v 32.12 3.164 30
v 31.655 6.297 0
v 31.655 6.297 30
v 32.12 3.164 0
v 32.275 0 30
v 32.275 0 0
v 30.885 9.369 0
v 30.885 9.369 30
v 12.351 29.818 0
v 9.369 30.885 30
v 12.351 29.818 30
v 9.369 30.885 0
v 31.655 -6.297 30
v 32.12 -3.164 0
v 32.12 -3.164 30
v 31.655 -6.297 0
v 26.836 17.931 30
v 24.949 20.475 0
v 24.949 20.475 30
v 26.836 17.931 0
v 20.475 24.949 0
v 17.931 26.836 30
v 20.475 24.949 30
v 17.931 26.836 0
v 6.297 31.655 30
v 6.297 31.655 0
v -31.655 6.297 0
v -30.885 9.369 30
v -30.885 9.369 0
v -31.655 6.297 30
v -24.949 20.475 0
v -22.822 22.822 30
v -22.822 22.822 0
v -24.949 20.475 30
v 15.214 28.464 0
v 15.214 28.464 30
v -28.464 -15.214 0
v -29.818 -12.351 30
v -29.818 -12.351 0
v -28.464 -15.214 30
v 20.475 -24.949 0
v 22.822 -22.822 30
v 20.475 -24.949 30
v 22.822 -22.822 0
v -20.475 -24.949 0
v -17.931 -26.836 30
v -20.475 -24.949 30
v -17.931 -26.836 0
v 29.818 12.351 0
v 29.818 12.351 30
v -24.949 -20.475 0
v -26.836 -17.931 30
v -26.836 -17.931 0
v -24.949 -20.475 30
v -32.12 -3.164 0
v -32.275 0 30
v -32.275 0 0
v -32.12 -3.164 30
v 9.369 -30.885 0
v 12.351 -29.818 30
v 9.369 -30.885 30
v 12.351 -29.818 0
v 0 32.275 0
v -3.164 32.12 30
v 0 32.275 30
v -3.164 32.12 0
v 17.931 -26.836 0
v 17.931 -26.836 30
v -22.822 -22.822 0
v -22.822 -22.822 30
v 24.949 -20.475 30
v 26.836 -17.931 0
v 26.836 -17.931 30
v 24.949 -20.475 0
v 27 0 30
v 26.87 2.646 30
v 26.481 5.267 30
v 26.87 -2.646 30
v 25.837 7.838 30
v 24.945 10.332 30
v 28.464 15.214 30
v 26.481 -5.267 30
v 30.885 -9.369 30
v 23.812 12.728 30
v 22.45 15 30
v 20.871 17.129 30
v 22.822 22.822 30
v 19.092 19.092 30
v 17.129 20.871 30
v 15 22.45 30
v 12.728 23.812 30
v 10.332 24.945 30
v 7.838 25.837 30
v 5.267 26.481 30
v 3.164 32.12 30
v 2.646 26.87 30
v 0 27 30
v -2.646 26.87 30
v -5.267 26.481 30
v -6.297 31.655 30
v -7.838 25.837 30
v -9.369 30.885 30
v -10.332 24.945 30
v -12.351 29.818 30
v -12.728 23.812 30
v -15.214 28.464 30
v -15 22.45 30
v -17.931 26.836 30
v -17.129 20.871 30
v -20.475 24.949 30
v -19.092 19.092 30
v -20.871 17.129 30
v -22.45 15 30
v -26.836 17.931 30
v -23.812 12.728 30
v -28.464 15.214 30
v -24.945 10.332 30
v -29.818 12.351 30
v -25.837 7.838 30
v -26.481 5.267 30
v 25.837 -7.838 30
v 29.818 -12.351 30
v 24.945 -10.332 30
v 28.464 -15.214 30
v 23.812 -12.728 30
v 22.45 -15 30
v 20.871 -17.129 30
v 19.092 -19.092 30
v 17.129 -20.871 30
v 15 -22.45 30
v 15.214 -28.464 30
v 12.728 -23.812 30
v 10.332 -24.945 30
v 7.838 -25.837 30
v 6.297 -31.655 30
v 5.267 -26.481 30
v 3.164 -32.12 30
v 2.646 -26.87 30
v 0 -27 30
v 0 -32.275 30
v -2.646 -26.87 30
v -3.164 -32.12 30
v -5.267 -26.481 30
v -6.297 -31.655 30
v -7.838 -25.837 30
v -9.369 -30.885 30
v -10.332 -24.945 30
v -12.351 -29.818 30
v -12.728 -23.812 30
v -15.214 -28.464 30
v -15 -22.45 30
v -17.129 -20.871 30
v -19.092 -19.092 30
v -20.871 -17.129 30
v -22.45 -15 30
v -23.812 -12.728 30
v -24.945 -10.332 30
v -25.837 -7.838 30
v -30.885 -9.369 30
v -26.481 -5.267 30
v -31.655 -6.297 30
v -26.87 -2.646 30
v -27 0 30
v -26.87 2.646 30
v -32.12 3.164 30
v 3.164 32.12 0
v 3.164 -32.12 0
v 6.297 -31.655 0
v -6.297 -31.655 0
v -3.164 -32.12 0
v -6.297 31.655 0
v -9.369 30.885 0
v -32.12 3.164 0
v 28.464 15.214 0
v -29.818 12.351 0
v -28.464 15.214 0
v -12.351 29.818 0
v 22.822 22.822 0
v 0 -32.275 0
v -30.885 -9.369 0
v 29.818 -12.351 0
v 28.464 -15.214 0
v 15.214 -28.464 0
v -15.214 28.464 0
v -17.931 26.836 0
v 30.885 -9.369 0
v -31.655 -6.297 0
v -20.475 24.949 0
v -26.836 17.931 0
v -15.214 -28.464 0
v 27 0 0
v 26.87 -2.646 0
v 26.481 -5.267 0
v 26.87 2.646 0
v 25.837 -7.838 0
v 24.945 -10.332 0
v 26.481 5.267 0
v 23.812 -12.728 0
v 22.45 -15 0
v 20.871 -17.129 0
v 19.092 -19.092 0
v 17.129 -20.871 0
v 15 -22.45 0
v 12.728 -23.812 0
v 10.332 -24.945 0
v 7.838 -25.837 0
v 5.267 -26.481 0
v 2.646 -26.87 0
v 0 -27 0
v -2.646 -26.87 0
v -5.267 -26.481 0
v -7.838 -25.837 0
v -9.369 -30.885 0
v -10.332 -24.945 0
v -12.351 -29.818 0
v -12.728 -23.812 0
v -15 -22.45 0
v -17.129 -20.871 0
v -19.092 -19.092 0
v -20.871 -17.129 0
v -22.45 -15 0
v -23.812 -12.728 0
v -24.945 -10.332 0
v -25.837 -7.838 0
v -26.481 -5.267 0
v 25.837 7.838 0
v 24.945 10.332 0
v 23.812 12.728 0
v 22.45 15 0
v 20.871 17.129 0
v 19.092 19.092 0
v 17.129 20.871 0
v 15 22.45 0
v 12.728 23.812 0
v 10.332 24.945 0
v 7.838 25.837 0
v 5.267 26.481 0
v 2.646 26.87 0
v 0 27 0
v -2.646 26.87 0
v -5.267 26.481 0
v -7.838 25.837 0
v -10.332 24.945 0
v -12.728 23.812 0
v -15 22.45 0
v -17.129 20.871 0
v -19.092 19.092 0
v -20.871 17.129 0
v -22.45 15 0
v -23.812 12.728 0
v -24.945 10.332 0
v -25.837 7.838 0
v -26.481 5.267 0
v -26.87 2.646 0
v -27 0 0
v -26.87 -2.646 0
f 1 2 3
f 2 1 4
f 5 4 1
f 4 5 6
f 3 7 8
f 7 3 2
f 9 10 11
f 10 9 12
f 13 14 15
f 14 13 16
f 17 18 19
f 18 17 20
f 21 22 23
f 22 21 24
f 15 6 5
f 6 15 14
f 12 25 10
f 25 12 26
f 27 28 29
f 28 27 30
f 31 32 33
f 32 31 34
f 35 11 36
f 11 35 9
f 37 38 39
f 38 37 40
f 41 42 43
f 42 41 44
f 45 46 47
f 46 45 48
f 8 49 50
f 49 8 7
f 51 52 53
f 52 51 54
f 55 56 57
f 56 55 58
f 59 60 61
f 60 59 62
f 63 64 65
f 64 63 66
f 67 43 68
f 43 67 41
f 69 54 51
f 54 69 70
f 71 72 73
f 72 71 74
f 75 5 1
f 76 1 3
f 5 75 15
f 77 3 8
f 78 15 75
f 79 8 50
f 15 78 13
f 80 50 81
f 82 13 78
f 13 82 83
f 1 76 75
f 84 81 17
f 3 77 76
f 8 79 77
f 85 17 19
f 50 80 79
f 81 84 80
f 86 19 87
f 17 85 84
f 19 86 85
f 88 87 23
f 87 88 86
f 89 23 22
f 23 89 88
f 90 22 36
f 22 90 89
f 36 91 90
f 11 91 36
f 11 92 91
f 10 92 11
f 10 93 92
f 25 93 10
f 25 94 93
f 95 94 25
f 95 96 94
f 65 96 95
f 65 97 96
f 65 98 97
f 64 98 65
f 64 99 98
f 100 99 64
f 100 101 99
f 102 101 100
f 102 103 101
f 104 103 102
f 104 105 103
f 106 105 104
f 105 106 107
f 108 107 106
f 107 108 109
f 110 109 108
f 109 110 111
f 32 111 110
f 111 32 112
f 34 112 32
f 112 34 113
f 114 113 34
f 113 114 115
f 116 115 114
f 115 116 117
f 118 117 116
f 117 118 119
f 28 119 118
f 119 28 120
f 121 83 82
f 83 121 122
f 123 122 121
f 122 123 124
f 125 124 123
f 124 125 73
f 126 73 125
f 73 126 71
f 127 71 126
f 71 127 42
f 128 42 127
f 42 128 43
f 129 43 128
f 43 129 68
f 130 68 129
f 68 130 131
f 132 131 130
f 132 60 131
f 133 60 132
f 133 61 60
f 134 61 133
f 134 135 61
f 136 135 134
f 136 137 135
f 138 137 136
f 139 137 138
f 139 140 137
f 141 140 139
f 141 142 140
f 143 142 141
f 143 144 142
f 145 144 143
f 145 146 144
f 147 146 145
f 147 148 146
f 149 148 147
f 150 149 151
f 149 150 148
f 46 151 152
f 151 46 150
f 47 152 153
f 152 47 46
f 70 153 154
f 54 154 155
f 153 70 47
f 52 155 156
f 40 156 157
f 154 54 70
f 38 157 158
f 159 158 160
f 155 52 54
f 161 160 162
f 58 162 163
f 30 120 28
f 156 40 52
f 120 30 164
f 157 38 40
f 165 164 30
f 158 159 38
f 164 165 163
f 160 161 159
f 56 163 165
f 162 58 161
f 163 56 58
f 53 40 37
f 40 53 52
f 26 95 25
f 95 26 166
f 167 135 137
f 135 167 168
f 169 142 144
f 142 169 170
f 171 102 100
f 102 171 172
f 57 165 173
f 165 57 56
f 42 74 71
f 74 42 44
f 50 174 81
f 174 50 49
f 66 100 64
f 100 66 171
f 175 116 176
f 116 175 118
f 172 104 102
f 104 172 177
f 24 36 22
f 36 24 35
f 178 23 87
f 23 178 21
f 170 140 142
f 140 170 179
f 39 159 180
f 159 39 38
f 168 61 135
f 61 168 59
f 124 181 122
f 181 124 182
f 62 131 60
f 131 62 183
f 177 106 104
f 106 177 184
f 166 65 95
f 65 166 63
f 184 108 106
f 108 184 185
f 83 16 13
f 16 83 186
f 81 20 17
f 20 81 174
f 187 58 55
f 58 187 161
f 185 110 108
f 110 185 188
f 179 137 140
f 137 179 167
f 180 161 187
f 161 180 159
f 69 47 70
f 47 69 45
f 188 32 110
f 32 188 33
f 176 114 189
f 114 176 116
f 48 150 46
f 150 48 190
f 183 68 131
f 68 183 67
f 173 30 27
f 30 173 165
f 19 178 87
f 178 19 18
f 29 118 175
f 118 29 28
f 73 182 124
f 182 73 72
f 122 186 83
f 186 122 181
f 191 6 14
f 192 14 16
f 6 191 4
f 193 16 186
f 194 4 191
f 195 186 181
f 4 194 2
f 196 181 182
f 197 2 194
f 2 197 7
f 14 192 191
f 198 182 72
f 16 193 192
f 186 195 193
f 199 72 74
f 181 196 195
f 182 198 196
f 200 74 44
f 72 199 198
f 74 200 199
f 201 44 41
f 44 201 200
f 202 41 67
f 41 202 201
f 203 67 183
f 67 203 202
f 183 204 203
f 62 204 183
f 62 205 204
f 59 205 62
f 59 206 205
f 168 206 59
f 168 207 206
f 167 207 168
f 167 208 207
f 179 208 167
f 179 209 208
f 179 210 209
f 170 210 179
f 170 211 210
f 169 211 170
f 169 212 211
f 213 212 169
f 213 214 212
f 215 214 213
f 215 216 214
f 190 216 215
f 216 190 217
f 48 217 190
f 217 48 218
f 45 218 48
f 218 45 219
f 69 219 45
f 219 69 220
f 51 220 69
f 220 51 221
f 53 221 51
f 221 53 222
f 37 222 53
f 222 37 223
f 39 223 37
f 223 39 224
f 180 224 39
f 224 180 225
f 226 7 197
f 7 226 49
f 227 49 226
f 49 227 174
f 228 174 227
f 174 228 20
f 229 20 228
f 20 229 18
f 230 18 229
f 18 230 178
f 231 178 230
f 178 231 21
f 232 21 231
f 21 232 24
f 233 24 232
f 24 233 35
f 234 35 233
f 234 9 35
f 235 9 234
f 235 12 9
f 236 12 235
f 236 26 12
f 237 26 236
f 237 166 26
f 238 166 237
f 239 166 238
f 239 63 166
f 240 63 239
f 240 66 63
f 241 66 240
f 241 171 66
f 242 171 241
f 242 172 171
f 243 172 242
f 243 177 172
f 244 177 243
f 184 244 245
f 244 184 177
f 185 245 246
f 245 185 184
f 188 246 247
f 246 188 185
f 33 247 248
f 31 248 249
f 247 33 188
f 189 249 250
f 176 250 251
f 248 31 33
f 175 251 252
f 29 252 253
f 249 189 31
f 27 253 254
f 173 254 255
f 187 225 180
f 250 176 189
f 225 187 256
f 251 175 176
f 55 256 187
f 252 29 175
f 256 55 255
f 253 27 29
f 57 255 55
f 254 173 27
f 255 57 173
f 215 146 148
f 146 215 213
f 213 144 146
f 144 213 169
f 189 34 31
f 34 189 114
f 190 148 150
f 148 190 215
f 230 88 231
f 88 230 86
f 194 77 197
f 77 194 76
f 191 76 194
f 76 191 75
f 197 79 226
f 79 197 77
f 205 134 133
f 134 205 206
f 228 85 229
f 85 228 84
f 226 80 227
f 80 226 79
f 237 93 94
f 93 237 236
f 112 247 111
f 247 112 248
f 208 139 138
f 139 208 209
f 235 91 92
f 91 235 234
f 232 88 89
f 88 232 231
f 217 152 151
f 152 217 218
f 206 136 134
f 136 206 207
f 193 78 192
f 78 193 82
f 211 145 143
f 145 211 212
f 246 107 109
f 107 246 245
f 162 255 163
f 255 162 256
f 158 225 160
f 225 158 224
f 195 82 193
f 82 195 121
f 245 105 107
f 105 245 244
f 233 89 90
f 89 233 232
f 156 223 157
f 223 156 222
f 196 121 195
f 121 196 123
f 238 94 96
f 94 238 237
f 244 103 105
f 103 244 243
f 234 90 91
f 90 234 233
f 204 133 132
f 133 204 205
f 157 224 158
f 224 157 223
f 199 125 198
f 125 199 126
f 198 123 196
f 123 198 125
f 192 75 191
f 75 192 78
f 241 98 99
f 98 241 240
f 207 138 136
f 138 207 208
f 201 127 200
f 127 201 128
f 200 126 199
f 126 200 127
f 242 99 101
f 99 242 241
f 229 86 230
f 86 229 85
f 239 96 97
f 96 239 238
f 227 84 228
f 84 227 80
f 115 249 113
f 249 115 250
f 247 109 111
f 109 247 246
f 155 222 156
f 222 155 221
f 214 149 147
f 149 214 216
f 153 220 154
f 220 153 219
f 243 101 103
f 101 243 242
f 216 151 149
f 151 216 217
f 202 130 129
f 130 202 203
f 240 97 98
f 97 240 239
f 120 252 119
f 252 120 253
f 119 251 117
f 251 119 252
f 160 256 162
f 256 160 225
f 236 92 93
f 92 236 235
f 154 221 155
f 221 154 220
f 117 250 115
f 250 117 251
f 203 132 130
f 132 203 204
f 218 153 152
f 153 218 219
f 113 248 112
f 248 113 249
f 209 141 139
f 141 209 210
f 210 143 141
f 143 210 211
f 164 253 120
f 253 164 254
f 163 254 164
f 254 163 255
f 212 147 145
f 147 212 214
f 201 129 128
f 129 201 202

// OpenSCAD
// file: ../config/parameters.scad
// cobot-lite 전역 파라미터 (global parameters)
// 모든 부품 치수는 이 파일에서만 정의한다 — 매직 넘버 하드코딩 금지 (MEC-008)

/* ===== 출력/렌더링 ===== */
$fn = 64;

/* ===== 공통 가공 여유 (파생 치수에서 참조 — 선행 정의 필수) ===== */
clearance_fit = 0.3;      // 회전/슬라이드 끼움 여유
bolt_hole_oversize = 0.4; // 관통 볼트 홀 여유

/* ===== 베어링 (bearing) — CON-002: 이 4종만 사용 =====
   [내경, 외경, 폭] mm */
BRG_608ZZ  = [8,  22, 7];   // 관절 피벗 (8mm 숄더 볼트)
BRG_625ZZ  = [5,  16, 5];   // 평행 링크 피벗 (5mm 숄더 볼트)
BRG_6805ZZ = [25, 37, 7];   // 손목 롤 축, 중구경 허브
BRG_6810ZZ = [50, 65, 7];   // 베이스 턴테이블 메인 베어링

// 베어링 압입 공차 (press-fit tolerance) — MFG-002
// 외경 기준 -0.1 ~ -0.2mm. 프린터별 보정은 이 변수 하나로 조정한다.
bearing_press_fit = -0.15;

/* ===== 숄더 볼트 (stripper/shoulder bolt) — CON-001 ===== */
shoulder_d_small = 5;   // 625ZZ 결합
shoulder_d_large = 8;   // 608ZZ 결합

/* ===== 링크 길이 — MEC-006 [TBD-4] =====
   리치 500mm 잠정. 비대칭 분할 (J2 자중 부담 보상, MEC-001a 분담 구조) */
L1 = 225;   // 상완 (upper arm): J2 축 → J3 축
L2 = 275;   // 하완 (forearm): J3 축 → 공구 플랜지

/* ===== 링크 꺾임 (팔레타이저식 구조 오프셋) =====
   관절 축 좌표는 불변(직선 L1/L2 기준) — 꺾임은 빔 형상만 변경.
   목적: ① 신장/접힘 한계 자세에서 빔-빔 간섭 여유 확보
        ② 구조 외곽을 축선 위로 올려 저자세 작업 시 팔꿈치 하부 돌출 감소
   니(knee) 수직 오프셋 h = L·pos·(1-pos)·tan(deg) */
ua_bend_deg = 12;     // 상완 꺾임각 (0 = 직선)
ua_bend_pos = 0.68;   // 꺾임 위치 (0~1, J2 기준) — 분할 조인트(95~131) 뒤
fa_bend_deg = 12;     // 하완 꺾임각
fa_bend_pos = 0.5;    // 꺾임 위치 (팔꿈치 기준)

/* ===== 가동 엔벨로프 (소프트 리미트 권고값 — docs/design-notes.md) =====
   접힘각 = J3 - J2 (월드 피치 차).
   -90° = 평행사변형 구동 전동각(transmission angle) 특이점 (크랭크∥링크),
     0° = 완전 신장 특이점 (J2·J3·손목 일직선). 양쪽 모두 운용 금지 */
env_fold_min = -75;   // 접힘 한계 (전동각 sin25° ≈ 0.42 이상 확보)
env_fold_max = -3;    // 신장 한계 (리치 ≈ 499.5mm — 공칭 500 대비 -0.5)

// J3 모터 후방 배치 연장 길이 (MEC-001c)
// J2 액추에이터는 J2 축 동축 직결 (MEC-001b) — 후방 배치 대상은 J3 어셈블리만
// J1 회전 시 베이스·작업물 간섭 확인 필수
rear_extension = 80;    // J2 피벗 → J3 모터+기어박스 어셈블리 중심 [잠정]

/* ===== 턴테이블 (turntable) — MEC-003 ===== */
turntable_bearing_gap = 30;   // 6810ZZ 2개 축방향 이격, 30mm 이상 (SHOULD)

/* ===== 모터 (motor) — CON-004: 산요덴키 SF24 시리즈 =====
   NEMA 17 호환 42각 */
motor_frame = 42;             // 프레임 폭 (mm)
nema17_hole_pitch = 31;       // 고정 볼트 피치
nema17_pilot_d = 22;          // 센터 파일럿 직경
nema17_bolt_d = 3;            // M3

/* ===== 감속비 (gear ratio) — CON-005: 5/10/20만 허용 ===== */
// 주의: MG17-G10(10:1)은 허용 토크 5N·m로 급락 — 변경 시 토크 재검증 (docs/torque-budget.md)
ratio_J1 = 20;
ratio_J2 = 20;
ratio_J3 = 20;   // SF2423 + 20:1 확정 (TBD-3 해결)
ratio_J4 = 5;

/* ===== 기어박스 (gearbox) — MG17 데이터시트 (docs/tbd-research.md TBD-5) ===== */
gbx_frame = 42;            // NEMA 17 플랜지, 모터와 동일 42각
gbx_len_20to1 = 51;        // MG17-G20 길이 (J1~J3)
gbx_len_5to1  = 40;        // MG17-G5 길이 (J4)
gbx_out_shaft_d = 8;       // 출력축 직경
gbx_in_insert = 9.5;       // 입력 결합 깊이 — SF24 축 길이 호환 확인 항목
gbx_mass_20to1 = 400;      // g — 질량 예산 계산용
gbx_mass_5to1  = 350;      // g

/* ===== 모터 몸체 치수 — SF24 카탈로그 일반값 [잠정: 구매 데이터시트로 확인] ===== */
motor_len_SF2424 = 47;    // J1, J2
motor_len_SF2423 = 39;    // J3
motor_len_SF2422 = 33;    // J4
motor_shaft_d = 5;        // SF24 출력축 (MG17 입력 클램프 ⌀5)
gbx_out_shaft_len = 20;   // MG17 출력축 돌출 길이

/* ===== 베이스/J1 (MEC-003, MEC-005) ===== */
base_plate_size = 140;    // 정사각 베이스 플레이트 한 변
base_plate_t = 8;
base_bolt_d = 5;          // M5 ×4 작업대 고정 (MEC-005)
base_bolt_pitch = 120;    // 고정 볼트 피치
base_col_wall = 5;        // 턴테이블 칼럼 벽 두께
col_window_w = 50;        // 칼럼 측면 배선/조립 창 폭
turntable_top_d = 100;    // 턴테이블 상판 직경
turntable_top_t = 8;
j1_actuator_gap = 4;      // 베이스 플레이트 상면 → 모터 하면 여유
col_open_h = 24;          // 모터 플로어 상면 → 하부 베어링 (스템 결합·셋스크류 존)
j1_stem_d = 20;           // 턴테이블 허브 스템(출력축 결합부) 외경
set_screw_pilot_d = 3.4;  // M4 무두 볼트(set screw) 셀프태핑 파일럿
m3_tap_d = 2.8;           // M3 셀프태핑 파일럿 (앵커 등 소형 체결)
shoulder_mount_px = 80;   // 어깨 텅 ↔ 턴테이블 볼트 피치 X
shoulder_mount_py = 50;   // 어깨 텅 ↔ 턴테이블 볼트 피치 Y
shoulder_mount_bolt_d = 5;// M5 ×4
shoulder_tongue_x = 40;   // 어깨 텅 깊이(X) — 포크 내 스윕 간섭 한계 결정 (J2 ≈ ±55°)

/* ===== 암 단면/관절 (MEC-004) — v0.13 플레이트 아키텍처 =====
   원칙: 출력물은 평판(plate)만. 간격은 표준 스페이서 튜브 + 관통 볼트가
   결정 (일체 보스·웹·박스 금지). 관절 베어링은 플레이트에 직접 압입 —
   플레이트 두께 = 608ZZ 폭(7) */
arm_plate_t = 7;          // 측판 두께 = 608ZZ 폭 (베어링 인-플레이트 압입)
fork_standoff_len = 30;   // 표준 육각 스탠드오프 길이 (어깨 포크 갭 = 하완 내폭)
hex_standoff_af = 13;     // 두꺼운 육각 스탠드오프 평면폭 (M6 암-암)
joint_spacer_od = 12;     // 관절 스택 스페이서 튜브 외경 (숄더 ⌀8 위)
ua_split_x = 115;         // 상완 플레이트 분할선 (365 > 빌드 대각 한계)
ua_splice = [99, 131];    // 스플라이스 더블러 볼트 X 위치 (분할선 ±16)
// 어깨 텅(플레이트 스택) 폭 = 플레이트 14 ×2 + 표준 스탠드오프 30 (v0.13)
tongue_w = 28 + fork_standoff_len;          // 58
// 상완 포크 내폭 = 표준 육각 스탠드오프 L60 (전 스탠드오프 표준화 — v0.14).
// 텅 58과의 편차 1mm/측은 J2 스택 M8 와셔가 흡수 (CON-001 와셔 기존 품목)
arm_inner_w = 60;
arm_h = 50;               // 암 단면 높이
j2_axis_h = 90;           // 턴테이블 상면 → J2 축 높이
                          // — J2 +45° 시 후방 러그 하단 ↔ 어깨 플랜지 간섭 회피 (간섭 검사 확인)
j3_crank_len = 40;        // J3 크랭크 = 하완 혼 반경 (평행사변형 1:1)
pl_offset = 45;           // 수동 평행사변형(MEC-002) 피벗 오프셋
                          // — J2 모터 42각 코너 스윕 반경(≈30) + 여유
forearm_inner_w = fork_standoff_len;  // 하완 측판 내폭 = 표준 스탠드오프 30 (v0.13)
beam_w = 40;              // 상완/하완 중앙 보(beam) 폭
arm_lug_r = 26;           // 관절 러그(피벗 보스) 반경 — NEMA17 볼트 코너(r≈21.9) + 벽
beam_wall = 4;            // 보 쉘 벽 두께 (경량화)
pivot_engage = 14;        // 축 클램프/베어링 물림 깊이
crank_t = 8;              // J3 크랭크 암 두께
crank_hub_d = 20;         // 크랭크 허브 외경
crank_hub_w = 12;         // 크랭크 허브 폭
dl_offset = 8;            // 구동 링크 평면: 플레이트 A 외면 → 링크 중심 거리
ua_joint_x = 95;          // 상완 분할 조인트 위치 (MFG-004: 365mm > 빌드 대각 한계)
ua_lap = 36;              // 랩 조인트(소켓-테논) 물림 길이

/* ===== 너트 평면폭 (across flats) ===== */
m3_nut_af = 5.5;
m4_nut_af = 7;
m6_nut_af = 10;
link_bar_w = 12;          // 링크 바 단면 폭
link_bar_t = 6;           // 링크 바 단면 두께
link_boss_d = 24;         // 링크 단부 625ZZ 보스 외경 (625 외경 16 + 벽 4×2)

/* ===== 손목/공구 플랜지 (GEN-004) ===== */
wrist_offset = 50;        // 손목 피치 피벗 → J4(플랜지) 축 수평 오프셋
                          // — J4 모터 몸체 ↔ 하완 러그 스윕 간섭 회피 (≥ lug_r + 모터 반폭)
forearm_len = L2 - wrist_offset; // 팔꿈치 축 → 손목 피치 피벗
wrist_wall = 5;           // 손목 하우징 벽 두께
flange_d = 45;            // 공구 플랜지 직경
flange_t = 8;
flange_bc = 32;           // 그리퍼 볼트 서클
flange_bolt_d = 4;        // M4 ×4

/* ===== 리미트 스위치 (ELE-004) — KW12형 기계식 마이크로 기준품 ===== */
ls_body = [20, 10, 6.5];  // 몸체 [길이, 높이, 두께]
ls_hole_pitch = 9.5;      // 장착 홀 피치
ls_hole_d = 2.3;          // M2 셀프태핑/볼트

/* ===== 질량 산출 (MEC-007, docs/mass-budget.md) ===== */
petgcf_density = 1.30;    // g/cm³ (PETG-CF 카탈로그 일반값)
print_solidity = 0.6;     // 쉘+인필 유효 충전율 [잠정 — 슬라이서 추정으로 대체]
motor_mass_SF2424 = 510;  // g (산요 카탈로그 확정)
motor_mass_SF2423 = 380;
motor_mass_SF2422 = 300;

/* ===== 질량/성능 예산 ===== */
payload = 1.0;            // kg, 그리퍼 포함 정격 (PER-001)
moving_mass_budget = 0.8; // kg, 상완 이후 이동부 상한 (MEC-007)

/* ===== 출력 제약 — MFG-004 (Creality SparkX i7, TBD-8 해결) ===== */
build_volume = [260, 260, 255];
// main file
// 턴테이블 베어링 스페이서 (spacer ring) — 6810ZZ ×2 외륜 이격 30mm 유지 (MEC-003)
// 베이스 칼럼 보어에 슬립 끼움 (압입 아님).
include <../config/parameters.scad>

module turntable_spacer() {
    difference() {
        cylinder(d = BRG_6810ZZ[1] + bearing_press_fit - clearance_fit,
                 h = turntable_bearing_gap);
        translate([0, 0, -0.1])
            cylinder(d = BRG_6810ZZ[0] + 4, h = turntable_bearing_gap + 0.2);
    }
}

turntable_spacer();
